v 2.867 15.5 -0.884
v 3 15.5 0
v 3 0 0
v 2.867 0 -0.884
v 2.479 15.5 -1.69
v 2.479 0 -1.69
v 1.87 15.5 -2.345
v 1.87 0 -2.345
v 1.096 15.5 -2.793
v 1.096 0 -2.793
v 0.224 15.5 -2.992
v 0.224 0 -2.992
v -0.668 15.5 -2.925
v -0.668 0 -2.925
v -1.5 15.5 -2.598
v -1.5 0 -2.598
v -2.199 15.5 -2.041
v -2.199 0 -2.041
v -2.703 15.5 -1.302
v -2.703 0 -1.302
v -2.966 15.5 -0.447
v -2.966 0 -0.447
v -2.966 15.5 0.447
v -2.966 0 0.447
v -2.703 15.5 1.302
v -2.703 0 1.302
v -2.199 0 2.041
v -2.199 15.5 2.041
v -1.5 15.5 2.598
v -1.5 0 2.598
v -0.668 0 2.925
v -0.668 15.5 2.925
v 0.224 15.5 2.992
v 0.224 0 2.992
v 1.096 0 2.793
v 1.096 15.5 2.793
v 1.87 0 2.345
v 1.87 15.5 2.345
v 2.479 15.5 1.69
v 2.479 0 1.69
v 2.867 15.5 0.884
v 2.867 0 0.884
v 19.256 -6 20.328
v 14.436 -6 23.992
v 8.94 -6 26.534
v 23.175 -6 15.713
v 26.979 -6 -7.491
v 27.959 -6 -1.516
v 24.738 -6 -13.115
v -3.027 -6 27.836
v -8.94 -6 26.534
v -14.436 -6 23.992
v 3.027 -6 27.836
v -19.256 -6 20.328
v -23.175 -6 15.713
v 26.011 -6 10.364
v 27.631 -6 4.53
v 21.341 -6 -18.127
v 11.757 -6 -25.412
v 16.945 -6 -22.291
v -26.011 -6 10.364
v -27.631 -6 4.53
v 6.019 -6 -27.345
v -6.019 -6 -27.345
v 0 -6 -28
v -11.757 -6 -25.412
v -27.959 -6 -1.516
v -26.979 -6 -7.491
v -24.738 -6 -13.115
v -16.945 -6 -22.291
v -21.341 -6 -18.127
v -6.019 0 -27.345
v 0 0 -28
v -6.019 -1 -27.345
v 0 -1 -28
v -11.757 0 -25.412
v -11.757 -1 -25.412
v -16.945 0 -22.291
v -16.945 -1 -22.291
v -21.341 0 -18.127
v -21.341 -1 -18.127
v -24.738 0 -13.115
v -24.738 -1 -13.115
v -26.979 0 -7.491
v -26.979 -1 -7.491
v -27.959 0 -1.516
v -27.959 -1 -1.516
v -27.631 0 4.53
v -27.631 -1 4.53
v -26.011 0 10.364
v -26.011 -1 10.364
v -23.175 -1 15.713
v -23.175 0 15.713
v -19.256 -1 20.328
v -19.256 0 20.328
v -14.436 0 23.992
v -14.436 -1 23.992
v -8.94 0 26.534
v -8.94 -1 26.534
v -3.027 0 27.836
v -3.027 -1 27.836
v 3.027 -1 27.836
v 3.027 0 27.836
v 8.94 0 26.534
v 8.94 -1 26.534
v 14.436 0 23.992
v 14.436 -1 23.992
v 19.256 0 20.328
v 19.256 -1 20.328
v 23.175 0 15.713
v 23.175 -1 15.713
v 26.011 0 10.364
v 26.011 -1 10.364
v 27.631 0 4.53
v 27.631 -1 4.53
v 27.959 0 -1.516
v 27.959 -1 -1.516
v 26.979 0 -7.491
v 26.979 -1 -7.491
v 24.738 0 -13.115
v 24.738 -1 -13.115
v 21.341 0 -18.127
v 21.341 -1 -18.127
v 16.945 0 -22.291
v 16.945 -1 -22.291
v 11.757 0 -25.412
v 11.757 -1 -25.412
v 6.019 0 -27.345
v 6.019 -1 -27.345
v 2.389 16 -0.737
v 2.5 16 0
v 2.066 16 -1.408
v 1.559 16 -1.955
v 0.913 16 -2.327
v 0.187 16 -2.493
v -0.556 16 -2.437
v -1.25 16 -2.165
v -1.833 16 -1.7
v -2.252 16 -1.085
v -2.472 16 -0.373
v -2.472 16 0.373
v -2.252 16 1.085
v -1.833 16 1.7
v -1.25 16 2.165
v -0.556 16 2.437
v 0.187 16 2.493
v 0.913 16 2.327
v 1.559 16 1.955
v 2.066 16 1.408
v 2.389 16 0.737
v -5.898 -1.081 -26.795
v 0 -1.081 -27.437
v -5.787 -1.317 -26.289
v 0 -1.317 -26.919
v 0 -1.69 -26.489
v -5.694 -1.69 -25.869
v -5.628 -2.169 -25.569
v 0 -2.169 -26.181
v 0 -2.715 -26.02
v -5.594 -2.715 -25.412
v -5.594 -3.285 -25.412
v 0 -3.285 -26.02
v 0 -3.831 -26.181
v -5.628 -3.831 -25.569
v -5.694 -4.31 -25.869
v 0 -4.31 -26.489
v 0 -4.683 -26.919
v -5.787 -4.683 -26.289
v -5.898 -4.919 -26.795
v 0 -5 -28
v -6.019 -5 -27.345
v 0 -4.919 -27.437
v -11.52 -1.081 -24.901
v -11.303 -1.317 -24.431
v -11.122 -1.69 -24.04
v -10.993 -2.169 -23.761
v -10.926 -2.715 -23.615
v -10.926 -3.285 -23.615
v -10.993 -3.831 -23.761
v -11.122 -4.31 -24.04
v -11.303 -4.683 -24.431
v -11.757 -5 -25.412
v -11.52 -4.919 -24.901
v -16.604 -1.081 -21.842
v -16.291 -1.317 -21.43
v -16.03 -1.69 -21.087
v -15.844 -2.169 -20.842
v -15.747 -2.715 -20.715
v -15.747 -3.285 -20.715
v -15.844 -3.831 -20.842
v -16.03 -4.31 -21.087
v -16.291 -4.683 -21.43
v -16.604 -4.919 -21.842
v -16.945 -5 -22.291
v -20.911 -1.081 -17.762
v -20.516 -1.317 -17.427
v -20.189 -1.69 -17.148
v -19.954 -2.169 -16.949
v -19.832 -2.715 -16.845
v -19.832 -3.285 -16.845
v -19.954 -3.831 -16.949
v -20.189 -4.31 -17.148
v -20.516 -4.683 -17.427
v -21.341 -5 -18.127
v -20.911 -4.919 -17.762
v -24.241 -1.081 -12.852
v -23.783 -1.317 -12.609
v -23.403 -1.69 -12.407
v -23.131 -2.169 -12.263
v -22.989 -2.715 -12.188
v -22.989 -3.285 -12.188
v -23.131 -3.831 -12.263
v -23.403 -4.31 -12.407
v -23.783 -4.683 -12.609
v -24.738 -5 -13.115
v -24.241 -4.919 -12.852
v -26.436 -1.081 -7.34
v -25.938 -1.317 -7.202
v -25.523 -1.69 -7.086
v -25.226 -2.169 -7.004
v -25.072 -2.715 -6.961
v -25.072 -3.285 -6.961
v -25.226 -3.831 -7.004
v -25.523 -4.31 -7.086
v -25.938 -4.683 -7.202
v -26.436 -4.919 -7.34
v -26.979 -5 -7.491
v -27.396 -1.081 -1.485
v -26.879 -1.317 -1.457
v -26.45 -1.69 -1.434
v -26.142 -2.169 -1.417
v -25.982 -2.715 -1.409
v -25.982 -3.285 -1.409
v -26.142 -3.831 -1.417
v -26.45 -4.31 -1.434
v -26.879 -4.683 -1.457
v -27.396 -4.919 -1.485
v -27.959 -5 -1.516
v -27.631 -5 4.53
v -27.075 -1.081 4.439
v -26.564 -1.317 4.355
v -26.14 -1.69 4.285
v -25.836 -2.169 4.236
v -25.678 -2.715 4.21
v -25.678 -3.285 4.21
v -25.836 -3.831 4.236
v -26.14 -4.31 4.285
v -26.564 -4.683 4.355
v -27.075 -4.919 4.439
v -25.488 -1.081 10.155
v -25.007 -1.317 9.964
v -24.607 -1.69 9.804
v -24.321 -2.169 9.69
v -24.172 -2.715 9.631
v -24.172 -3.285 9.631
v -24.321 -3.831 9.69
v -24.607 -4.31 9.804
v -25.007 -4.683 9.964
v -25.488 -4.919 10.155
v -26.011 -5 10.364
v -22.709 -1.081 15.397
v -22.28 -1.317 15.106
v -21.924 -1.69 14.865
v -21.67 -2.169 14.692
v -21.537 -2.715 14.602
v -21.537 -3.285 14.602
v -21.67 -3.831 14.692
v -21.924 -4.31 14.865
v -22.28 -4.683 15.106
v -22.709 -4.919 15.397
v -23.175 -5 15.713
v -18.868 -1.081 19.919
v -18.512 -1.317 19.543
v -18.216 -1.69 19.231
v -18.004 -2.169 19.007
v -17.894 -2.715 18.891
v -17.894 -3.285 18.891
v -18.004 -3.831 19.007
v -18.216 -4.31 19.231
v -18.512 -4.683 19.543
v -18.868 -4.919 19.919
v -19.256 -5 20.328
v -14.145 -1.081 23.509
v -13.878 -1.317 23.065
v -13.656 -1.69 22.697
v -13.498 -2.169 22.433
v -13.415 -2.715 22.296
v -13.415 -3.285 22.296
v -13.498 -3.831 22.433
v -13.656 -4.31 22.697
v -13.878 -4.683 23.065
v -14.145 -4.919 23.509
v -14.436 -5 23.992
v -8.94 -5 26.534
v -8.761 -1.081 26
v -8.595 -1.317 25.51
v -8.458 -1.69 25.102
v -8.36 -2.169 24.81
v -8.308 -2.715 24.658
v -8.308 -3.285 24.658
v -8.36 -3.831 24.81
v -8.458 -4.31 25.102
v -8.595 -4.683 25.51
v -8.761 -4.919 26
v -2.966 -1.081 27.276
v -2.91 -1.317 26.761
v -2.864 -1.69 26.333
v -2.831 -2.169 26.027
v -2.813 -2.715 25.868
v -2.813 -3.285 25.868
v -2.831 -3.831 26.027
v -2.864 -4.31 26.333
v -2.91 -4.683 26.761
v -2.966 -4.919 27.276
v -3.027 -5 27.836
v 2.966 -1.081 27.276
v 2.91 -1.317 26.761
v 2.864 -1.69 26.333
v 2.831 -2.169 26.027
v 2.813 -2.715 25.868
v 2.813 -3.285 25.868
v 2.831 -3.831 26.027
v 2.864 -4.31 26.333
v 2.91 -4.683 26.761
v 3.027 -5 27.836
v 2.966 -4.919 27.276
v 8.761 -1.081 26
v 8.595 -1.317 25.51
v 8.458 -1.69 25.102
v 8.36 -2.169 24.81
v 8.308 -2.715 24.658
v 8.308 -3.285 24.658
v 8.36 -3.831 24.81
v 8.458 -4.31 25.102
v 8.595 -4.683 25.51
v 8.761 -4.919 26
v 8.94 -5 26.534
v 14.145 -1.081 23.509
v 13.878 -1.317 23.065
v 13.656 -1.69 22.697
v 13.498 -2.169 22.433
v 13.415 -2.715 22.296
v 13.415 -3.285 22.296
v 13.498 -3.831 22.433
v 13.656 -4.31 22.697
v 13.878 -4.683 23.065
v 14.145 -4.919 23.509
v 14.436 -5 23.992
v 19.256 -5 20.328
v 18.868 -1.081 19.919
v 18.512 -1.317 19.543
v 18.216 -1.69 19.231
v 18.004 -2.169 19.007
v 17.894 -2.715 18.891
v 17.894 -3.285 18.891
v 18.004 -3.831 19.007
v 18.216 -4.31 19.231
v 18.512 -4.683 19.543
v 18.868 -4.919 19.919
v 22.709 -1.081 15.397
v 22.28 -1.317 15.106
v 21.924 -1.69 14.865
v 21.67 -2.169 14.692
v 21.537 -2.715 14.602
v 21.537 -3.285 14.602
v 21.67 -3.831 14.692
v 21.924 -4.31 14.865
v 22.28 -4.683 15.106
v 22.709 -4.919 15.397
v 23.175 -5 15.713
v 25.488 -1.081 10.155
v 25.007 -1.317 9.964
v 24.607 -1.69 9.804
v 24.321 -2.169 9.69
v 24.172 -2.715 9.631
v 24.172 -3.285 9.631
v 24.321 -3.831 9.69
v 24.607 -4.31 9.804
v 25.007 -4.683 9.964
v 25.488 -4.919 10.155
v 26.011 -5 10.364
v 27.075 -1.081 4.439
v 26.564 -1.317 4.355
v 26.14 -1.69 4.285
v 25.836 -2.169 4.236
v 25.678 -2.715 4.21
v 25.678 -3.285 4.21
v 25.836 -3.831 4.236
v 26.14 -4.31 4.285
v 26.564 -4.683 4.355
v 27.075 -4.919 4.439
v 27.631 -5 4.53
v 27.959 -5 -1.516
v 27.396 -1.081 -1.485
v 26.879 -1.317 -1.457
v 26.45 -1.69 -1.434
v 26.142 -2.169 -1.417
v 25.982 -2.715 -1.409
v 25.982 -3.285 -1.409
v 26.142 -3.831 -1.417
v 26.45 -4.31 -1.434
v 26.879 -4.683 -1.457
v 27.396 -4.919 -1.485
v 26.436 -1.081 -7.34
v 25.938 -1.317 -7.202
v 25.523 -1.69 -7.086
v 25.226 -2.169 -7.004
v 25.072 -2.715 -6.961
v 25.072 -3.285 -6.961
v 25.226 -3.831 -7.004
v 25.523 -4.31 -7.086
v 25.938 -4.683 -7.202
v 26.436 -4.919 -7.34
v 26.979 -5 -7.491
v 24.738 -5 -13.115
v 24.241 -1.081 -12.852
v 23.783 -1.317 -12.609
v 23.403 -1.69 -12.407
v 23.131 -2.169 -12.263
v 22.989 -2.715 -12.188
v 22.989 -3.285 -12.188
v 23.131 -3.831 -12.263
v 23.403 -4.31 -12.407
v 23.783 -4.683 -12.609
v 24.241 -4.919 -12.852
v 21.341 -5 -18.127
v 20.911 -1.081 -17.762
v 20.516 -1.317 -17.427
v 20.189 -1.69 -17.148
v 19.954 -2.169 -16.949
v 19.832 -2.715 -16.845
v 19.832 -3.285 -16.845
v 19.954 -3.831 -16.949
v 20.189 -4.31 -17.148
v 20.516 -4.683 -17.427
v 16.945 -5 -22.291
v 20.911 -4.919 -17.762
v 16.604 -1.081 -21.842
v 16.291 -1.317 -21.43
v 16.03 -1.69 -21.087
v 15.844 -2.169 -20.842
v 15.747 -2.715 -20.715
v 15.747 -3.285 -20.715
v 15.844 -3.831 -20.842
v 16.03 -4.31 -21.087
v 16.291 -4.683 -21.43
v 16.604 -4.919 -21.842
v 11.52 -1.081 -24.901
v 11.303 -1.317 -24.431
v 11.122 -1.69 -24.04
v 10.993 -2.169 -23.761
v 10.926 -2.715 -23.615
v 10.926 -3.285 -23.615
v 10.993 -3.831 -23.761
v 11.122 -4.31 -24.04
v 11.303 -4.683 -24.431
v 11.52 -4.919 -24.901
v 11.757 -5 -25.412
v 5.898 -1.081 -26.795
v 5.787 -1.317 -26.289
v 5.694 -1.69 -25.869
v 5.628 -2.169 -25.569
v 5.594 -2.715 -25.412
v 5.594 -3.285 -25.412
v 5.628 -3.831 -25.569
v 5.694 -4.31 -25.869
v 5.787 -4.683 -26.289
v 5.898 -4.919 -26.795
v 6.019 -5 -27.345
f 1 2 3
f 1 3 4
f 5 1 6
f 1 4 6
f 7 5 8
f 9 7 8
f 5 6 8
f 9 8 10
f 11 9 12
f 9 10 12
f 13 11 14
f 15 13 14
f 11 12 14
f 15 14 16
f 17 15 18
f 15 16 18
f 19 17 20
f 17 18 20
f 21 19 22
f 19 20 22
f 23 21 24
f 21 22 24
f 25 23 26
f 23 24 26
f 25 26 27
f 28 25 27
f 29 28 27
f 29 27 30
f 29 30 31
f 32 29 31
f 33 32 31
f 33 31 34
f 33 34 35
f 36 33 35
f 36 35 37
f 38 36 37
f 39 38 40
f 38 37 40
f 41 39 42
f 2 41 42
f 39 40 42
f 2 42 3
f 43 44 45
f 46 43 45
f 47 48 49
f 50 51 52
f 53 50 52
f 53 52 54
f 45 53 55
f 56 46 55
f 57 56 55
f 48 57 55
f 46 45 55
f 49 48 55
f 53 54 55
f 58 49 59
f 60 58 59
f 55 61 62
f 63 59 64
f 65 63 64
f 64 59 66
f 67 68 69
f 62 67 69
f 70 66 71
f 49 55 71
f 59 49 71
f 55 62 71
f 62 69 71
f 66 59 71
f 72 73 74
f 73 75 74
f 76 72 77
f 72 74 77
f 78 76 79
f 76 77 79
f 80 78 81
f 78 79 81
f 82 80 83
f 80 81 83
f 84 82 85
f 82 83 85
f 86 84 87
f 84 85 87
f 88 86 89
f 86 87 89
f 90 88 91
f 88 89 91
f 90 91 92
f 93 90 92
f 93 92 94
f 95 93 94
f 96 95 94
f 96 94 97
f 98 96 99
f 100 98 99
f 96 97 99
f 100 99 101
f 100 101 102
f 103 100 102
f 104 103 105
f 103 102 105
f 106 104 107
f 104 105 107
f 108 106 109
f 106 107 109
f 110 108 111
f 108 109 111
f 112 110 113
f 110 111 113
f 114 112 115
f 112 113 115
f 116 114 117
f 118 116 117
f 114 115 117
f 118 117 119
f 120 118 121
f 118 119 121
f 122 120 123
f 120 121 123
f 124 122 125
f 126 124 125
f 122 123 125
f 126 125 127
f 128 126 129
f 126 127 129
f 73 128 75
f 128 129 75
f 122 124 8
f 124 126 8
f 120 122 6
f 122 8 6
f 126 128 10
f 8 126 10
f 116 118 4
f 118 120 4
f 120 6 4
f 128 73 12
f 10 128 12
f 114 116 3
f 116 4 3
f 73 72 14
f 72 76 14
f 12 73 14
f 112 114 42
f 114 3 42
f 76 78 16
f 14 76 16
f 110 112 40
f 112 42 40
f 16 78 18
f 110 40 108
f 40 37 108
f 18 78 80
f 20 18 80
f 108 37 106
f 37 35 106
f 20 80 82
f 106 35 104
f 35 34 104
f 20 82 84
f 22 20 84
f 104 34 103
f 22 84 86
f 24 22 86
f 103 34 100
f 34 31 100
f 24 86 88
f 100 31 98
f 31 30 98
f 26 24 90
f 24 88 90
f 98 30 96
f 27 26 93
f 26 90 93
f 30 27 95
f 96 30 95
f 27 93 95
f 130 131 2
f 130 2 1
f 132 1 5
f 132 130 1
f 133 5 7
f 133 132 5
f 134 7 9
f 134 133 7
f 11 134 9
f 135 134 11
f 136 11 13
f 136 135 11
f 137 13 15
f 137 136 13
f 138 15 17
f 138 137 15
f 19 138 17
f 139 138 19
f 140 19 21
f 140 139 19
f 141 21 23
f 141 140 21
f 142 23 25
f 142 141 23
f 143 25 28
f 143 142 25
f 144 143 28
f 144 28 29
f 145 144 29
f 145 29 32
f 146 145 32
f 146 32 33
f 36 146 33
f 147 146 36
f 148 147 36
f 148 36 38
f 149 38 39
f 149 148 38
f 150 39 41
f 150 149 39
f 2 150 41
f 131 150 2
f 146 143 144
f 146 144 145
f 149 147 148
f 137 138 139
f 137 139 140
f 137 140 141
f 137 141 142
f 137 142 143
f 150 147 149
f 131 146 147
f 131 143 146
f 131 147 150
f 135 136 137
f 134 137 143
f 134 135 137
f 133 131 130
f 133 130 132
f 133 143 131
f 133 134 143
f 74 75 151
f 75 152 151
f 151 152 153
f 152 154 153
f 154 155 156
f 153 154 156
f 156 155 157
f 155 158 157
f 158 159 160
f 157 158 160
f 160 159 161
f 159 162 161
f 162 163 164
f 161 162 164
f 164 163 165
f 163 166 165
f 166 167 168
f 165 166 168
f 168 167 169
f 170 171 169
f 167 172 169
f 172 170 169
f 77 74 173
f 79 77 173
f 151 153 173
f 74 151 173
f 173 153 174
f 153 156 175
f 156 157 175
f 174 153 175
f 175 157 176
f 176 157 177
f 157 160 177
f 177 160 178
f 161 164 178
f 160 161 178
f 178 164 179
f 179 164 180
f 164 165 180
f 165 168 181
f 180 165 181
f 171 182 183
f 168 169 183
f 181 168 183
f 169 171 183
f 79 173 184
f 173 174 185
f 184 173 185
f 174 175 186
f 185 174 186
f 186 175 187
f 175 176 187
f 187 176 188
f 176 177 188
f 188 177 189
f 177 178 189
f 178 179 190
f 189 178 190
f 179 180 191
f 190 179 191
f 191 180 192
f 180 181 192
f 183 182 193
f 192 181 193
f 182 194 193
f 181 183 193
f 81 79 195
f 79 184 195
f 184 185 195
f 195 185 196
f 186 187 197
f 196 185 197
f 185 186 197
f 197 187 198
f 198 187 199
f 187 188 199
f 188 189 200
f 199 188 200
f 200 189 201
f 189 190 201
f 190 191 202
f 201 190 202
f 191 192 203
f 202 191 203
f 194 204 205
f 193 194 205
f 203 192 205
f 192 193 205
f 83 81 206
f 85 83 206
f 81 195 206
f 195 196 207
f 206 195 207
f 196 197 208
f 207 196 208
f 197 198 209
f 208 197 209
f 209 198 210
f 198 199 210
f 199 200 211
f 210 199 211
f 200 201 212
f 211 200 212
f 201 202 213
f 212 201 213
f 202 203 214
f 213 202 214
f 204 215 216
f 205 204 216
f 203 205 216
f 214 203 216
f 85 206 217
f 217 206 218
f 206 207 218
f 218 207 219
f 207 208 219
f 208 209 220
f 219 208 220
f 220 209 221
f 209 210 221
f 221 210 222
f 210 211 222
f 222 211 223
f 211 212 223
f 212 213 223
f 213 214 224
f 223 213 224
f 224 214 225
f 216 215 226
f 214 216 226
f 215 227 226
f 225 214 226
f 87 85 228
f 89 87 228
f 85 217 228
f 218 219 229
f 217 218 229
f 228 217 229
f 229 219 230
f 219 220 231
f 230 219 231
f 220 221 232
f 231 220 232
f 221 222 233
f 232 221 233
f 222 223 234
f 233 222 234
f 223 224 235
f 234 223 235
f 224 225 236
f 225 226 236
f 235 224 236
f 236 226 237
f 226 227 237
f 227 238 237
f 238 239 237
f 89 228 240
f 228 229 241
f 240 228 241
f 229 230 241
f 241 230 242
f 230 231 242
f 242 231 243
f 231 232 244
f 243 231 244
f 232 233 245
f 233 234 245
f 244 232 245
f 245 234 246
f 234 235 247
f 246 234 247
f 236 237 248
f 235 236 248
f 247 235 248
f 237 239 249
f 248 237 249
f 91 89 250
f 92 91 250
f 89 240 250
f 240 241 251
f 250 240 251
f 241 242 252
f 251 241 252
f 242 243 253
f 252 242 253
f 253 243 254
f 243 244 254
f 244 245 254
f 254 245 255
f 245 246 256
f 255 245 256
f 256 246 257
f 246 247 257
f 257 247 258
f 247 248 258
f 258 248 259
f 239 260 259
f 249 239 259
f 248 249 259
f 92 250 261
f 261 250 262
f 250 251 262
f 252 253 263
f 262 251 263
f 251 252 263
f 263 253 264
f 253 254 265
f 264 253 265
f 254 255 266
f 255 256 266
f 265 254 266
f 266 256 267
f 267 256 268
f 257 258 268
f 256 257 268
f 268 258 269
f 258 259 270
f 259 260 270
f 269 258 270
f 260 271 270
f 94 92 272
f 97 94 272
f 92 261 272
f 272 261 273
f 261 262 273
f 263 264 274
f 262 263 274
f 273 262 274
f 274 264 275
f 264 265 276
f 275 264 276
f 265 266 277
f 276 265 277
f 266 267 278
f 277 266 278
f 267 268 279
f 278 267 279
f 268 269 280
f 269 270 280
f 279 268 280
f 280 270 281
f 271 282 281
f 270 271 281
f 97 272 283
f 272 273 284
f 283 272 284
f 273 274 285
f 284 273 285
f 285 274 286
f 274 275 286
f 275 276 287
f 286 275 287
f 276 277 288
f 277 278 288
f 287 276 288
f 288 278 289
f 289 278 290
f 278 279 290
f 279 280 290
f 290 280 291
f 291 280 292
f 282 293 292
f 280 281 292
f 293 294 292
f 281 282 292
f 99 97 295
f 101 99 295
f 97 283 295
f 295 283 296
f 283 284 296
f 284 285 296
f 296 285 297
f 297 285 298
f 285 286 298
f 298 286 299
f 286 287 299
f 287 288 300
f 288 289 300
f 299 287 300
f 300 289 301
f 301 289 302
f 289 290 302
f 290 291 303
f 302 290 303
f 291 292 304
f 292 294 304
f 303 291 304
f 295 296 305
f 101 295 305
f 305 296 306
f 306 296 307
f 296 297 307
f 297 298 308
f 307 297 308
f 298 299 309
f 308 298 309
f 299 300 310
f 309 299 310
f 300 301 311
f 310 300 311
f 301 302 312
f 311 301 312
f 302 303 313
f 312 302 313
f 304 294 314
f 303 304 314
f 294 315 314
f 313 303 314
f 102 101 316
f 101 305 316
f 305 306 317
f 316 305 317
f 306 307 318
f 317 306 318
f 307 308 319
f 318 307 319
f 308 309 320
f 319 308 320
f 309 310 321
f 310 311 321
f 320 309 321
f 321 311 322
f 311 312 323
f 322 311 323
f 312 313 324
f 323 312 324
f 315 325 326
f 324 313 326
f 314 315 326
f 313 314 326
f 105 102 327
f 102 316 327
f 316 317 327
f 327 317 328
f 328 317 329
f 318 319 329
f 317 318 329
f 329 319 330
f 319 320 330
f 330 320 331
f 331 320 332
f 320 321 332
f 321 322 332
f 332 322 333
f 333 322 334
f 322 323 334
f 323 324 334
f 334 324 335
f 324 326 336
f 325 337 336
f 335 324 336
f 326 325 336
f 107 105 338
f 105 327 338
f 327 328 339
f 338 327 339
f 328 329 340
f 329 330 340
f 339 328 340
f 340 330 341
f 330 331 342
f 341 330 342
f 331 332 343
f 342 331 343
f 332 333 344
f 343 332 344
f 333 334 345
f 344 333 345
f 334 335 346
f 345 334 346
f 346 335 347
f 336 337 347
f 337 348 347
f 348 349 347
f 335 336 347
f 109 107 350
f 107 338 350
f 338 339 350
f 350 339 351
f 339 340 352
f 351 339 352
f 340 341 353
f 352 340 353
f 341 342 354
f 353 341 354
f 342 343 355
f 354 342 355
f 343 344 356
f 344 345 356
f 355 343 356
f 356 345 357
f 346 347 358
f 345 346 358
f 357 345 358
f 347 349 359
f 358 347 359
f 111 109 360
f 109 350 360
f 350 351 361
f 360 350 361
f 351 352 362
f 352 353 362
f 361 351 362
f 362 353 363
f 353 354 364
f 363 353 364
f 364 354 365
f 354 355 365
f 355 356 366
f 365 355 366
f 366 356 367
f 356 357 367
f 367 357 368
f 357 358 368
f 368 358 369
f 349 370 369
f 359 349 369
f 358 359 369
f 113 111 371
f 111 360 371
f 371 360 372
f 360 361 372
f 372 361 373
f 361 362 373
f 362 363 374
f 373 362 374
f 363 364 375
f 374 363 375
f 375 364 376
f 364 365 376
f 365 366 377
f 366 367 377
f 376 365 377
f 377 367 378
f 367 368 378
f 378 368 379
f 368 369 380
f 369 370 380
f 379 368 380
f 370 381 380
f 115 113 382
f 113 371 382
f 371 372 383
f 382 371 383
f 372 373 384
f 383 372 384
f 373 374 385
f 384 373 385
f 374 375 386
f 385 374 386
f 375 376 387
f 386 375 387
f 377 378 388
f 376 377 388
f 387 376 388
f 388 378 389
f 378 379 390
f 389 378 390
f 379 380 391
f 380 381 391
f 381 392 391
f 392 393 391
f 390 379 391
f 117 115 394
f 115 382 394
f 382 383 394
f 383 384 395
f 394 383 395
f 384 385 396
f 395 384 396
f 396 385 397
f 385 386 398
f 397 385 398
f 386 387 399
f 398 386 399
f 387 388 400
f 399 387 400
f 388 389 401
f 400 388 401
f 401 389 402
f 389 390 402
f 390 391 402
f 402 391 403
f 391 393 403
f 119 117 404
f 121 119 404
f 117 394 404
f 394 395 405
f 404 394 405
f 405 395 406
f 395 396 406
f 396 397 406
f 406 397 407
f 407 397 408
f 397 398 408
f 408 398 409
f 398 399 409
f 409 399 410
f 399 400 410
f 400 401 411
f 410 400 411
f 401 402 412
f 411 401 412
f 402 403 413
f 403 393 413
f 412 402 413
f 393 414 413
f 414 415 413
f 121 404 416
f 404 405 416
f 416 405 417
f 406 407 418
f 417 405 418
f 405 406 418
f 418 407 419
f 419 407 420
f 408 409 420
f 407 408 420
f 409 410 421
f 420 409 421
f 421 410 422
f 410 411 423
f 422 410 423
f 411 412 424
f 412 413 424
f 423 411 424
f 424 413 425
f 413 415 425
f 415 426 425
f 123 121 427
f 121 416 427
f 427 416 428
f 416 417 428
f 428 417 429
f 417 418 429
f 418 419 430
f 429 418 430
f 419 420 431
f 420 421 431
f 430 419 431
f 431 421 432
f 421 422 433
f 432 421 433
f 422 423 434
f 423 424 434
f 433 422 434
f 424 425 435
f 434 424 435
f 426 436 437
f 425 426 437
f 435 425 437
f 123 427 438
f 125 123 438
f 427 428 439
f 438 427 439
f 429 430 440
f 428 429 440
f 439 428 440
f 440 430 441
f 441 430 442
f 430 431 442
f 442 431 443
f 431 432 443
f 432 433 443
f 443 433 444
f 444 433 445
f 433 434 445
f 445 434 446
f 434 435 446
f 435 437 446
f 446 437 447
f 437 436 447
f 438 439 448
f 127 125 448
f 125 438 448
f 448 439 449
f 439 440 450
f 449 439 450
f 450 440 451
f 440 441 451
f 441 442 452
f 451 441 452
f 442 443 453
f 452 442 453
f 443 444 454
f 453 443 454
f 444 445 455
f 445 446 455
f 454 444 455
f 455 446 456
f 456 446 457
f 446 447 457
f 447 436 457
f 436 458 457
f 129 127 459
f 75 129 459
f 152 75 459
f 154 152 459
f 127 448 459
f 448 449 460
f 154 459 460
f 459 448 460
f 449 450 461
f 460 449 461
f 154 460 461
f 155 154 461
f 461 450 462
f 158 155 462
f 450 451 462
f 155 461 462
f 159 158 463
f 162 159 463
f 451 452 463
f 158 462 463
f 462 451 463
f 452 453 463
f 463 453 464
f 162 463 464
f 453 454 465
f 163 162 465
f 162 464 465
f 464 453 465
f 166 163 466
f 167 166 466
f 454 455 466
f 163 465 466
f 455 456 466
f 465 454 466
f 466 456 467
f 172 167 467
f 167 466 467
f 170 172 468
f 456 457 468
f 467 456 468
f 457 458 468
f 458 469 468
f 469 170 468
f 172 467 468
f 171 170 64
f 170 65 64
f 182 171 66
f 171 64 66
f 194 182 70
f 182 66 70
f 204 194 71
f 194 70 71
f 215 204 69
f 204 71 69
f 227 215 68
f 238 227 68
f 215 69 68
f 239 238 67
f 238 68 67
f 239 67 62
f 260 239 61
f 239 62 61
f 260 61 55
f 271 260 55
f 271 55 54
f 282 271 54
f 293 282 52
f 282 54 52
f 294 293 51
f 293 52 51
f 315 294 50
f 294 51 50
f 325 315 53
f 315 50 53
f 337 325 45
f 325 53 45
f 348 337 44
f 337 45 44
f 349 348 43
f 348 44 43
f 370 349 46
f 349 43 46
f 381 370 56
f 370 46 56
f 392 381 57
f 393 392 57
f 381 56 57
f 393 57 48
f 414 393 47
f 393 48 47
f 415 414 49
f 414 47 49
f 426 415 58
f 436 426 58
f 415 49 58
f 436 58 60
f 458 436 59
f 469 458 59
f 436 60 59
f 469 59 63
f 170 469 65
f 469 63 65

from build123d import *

# Parameters (mm, degrees)
ESQUISSE1_R        = 3
BOSS_EXTRU_1_DEPTH = 16
CHANFREIN1_SIZE    = 0.5


with BuildPart() as part:
    # Esquisse1 → Boss.-Extru.1 (new body)
    with BuildSketch(Plane(origin=(0, 0, 0), x_dir=(1, 0, 0), z_dir=(0, 1, 0))):
        Circle(ESQUISSE1_R)
    extrude(amount=BOSS_EXTRU_1_DEPTH)

    # Esquisse4 → Révolution1 (revolve)
    with BuildSketch(Plane(origin=(0, 0, 0), x_dir=(0, 0, -1), z_dir=(1, 0, 0))):
        with BuildLine():
            Line((0, 0), (28, 0))
            Line((28, 0), (28, -1))
            ThreePointArc((28, -1), (26, -3), (28, -5))
            Line((28, -5), (28, -6))
            Line((28, -6), (0, -6))
            Line((0, -6), (0, 0))
        make_face()
    revolve(axis=Axis((0, -6, 0), (0, 1, 0)))

    # Chanfrein1
    chanfrein1_edges = [part.edges().sort_by_distance(p)[0] for p in [
        (-3, 16, 0),
    ]]
    chamfer(chanfrein1_edges, length=CHANFREIN1_SIZE)


solid = part.part
